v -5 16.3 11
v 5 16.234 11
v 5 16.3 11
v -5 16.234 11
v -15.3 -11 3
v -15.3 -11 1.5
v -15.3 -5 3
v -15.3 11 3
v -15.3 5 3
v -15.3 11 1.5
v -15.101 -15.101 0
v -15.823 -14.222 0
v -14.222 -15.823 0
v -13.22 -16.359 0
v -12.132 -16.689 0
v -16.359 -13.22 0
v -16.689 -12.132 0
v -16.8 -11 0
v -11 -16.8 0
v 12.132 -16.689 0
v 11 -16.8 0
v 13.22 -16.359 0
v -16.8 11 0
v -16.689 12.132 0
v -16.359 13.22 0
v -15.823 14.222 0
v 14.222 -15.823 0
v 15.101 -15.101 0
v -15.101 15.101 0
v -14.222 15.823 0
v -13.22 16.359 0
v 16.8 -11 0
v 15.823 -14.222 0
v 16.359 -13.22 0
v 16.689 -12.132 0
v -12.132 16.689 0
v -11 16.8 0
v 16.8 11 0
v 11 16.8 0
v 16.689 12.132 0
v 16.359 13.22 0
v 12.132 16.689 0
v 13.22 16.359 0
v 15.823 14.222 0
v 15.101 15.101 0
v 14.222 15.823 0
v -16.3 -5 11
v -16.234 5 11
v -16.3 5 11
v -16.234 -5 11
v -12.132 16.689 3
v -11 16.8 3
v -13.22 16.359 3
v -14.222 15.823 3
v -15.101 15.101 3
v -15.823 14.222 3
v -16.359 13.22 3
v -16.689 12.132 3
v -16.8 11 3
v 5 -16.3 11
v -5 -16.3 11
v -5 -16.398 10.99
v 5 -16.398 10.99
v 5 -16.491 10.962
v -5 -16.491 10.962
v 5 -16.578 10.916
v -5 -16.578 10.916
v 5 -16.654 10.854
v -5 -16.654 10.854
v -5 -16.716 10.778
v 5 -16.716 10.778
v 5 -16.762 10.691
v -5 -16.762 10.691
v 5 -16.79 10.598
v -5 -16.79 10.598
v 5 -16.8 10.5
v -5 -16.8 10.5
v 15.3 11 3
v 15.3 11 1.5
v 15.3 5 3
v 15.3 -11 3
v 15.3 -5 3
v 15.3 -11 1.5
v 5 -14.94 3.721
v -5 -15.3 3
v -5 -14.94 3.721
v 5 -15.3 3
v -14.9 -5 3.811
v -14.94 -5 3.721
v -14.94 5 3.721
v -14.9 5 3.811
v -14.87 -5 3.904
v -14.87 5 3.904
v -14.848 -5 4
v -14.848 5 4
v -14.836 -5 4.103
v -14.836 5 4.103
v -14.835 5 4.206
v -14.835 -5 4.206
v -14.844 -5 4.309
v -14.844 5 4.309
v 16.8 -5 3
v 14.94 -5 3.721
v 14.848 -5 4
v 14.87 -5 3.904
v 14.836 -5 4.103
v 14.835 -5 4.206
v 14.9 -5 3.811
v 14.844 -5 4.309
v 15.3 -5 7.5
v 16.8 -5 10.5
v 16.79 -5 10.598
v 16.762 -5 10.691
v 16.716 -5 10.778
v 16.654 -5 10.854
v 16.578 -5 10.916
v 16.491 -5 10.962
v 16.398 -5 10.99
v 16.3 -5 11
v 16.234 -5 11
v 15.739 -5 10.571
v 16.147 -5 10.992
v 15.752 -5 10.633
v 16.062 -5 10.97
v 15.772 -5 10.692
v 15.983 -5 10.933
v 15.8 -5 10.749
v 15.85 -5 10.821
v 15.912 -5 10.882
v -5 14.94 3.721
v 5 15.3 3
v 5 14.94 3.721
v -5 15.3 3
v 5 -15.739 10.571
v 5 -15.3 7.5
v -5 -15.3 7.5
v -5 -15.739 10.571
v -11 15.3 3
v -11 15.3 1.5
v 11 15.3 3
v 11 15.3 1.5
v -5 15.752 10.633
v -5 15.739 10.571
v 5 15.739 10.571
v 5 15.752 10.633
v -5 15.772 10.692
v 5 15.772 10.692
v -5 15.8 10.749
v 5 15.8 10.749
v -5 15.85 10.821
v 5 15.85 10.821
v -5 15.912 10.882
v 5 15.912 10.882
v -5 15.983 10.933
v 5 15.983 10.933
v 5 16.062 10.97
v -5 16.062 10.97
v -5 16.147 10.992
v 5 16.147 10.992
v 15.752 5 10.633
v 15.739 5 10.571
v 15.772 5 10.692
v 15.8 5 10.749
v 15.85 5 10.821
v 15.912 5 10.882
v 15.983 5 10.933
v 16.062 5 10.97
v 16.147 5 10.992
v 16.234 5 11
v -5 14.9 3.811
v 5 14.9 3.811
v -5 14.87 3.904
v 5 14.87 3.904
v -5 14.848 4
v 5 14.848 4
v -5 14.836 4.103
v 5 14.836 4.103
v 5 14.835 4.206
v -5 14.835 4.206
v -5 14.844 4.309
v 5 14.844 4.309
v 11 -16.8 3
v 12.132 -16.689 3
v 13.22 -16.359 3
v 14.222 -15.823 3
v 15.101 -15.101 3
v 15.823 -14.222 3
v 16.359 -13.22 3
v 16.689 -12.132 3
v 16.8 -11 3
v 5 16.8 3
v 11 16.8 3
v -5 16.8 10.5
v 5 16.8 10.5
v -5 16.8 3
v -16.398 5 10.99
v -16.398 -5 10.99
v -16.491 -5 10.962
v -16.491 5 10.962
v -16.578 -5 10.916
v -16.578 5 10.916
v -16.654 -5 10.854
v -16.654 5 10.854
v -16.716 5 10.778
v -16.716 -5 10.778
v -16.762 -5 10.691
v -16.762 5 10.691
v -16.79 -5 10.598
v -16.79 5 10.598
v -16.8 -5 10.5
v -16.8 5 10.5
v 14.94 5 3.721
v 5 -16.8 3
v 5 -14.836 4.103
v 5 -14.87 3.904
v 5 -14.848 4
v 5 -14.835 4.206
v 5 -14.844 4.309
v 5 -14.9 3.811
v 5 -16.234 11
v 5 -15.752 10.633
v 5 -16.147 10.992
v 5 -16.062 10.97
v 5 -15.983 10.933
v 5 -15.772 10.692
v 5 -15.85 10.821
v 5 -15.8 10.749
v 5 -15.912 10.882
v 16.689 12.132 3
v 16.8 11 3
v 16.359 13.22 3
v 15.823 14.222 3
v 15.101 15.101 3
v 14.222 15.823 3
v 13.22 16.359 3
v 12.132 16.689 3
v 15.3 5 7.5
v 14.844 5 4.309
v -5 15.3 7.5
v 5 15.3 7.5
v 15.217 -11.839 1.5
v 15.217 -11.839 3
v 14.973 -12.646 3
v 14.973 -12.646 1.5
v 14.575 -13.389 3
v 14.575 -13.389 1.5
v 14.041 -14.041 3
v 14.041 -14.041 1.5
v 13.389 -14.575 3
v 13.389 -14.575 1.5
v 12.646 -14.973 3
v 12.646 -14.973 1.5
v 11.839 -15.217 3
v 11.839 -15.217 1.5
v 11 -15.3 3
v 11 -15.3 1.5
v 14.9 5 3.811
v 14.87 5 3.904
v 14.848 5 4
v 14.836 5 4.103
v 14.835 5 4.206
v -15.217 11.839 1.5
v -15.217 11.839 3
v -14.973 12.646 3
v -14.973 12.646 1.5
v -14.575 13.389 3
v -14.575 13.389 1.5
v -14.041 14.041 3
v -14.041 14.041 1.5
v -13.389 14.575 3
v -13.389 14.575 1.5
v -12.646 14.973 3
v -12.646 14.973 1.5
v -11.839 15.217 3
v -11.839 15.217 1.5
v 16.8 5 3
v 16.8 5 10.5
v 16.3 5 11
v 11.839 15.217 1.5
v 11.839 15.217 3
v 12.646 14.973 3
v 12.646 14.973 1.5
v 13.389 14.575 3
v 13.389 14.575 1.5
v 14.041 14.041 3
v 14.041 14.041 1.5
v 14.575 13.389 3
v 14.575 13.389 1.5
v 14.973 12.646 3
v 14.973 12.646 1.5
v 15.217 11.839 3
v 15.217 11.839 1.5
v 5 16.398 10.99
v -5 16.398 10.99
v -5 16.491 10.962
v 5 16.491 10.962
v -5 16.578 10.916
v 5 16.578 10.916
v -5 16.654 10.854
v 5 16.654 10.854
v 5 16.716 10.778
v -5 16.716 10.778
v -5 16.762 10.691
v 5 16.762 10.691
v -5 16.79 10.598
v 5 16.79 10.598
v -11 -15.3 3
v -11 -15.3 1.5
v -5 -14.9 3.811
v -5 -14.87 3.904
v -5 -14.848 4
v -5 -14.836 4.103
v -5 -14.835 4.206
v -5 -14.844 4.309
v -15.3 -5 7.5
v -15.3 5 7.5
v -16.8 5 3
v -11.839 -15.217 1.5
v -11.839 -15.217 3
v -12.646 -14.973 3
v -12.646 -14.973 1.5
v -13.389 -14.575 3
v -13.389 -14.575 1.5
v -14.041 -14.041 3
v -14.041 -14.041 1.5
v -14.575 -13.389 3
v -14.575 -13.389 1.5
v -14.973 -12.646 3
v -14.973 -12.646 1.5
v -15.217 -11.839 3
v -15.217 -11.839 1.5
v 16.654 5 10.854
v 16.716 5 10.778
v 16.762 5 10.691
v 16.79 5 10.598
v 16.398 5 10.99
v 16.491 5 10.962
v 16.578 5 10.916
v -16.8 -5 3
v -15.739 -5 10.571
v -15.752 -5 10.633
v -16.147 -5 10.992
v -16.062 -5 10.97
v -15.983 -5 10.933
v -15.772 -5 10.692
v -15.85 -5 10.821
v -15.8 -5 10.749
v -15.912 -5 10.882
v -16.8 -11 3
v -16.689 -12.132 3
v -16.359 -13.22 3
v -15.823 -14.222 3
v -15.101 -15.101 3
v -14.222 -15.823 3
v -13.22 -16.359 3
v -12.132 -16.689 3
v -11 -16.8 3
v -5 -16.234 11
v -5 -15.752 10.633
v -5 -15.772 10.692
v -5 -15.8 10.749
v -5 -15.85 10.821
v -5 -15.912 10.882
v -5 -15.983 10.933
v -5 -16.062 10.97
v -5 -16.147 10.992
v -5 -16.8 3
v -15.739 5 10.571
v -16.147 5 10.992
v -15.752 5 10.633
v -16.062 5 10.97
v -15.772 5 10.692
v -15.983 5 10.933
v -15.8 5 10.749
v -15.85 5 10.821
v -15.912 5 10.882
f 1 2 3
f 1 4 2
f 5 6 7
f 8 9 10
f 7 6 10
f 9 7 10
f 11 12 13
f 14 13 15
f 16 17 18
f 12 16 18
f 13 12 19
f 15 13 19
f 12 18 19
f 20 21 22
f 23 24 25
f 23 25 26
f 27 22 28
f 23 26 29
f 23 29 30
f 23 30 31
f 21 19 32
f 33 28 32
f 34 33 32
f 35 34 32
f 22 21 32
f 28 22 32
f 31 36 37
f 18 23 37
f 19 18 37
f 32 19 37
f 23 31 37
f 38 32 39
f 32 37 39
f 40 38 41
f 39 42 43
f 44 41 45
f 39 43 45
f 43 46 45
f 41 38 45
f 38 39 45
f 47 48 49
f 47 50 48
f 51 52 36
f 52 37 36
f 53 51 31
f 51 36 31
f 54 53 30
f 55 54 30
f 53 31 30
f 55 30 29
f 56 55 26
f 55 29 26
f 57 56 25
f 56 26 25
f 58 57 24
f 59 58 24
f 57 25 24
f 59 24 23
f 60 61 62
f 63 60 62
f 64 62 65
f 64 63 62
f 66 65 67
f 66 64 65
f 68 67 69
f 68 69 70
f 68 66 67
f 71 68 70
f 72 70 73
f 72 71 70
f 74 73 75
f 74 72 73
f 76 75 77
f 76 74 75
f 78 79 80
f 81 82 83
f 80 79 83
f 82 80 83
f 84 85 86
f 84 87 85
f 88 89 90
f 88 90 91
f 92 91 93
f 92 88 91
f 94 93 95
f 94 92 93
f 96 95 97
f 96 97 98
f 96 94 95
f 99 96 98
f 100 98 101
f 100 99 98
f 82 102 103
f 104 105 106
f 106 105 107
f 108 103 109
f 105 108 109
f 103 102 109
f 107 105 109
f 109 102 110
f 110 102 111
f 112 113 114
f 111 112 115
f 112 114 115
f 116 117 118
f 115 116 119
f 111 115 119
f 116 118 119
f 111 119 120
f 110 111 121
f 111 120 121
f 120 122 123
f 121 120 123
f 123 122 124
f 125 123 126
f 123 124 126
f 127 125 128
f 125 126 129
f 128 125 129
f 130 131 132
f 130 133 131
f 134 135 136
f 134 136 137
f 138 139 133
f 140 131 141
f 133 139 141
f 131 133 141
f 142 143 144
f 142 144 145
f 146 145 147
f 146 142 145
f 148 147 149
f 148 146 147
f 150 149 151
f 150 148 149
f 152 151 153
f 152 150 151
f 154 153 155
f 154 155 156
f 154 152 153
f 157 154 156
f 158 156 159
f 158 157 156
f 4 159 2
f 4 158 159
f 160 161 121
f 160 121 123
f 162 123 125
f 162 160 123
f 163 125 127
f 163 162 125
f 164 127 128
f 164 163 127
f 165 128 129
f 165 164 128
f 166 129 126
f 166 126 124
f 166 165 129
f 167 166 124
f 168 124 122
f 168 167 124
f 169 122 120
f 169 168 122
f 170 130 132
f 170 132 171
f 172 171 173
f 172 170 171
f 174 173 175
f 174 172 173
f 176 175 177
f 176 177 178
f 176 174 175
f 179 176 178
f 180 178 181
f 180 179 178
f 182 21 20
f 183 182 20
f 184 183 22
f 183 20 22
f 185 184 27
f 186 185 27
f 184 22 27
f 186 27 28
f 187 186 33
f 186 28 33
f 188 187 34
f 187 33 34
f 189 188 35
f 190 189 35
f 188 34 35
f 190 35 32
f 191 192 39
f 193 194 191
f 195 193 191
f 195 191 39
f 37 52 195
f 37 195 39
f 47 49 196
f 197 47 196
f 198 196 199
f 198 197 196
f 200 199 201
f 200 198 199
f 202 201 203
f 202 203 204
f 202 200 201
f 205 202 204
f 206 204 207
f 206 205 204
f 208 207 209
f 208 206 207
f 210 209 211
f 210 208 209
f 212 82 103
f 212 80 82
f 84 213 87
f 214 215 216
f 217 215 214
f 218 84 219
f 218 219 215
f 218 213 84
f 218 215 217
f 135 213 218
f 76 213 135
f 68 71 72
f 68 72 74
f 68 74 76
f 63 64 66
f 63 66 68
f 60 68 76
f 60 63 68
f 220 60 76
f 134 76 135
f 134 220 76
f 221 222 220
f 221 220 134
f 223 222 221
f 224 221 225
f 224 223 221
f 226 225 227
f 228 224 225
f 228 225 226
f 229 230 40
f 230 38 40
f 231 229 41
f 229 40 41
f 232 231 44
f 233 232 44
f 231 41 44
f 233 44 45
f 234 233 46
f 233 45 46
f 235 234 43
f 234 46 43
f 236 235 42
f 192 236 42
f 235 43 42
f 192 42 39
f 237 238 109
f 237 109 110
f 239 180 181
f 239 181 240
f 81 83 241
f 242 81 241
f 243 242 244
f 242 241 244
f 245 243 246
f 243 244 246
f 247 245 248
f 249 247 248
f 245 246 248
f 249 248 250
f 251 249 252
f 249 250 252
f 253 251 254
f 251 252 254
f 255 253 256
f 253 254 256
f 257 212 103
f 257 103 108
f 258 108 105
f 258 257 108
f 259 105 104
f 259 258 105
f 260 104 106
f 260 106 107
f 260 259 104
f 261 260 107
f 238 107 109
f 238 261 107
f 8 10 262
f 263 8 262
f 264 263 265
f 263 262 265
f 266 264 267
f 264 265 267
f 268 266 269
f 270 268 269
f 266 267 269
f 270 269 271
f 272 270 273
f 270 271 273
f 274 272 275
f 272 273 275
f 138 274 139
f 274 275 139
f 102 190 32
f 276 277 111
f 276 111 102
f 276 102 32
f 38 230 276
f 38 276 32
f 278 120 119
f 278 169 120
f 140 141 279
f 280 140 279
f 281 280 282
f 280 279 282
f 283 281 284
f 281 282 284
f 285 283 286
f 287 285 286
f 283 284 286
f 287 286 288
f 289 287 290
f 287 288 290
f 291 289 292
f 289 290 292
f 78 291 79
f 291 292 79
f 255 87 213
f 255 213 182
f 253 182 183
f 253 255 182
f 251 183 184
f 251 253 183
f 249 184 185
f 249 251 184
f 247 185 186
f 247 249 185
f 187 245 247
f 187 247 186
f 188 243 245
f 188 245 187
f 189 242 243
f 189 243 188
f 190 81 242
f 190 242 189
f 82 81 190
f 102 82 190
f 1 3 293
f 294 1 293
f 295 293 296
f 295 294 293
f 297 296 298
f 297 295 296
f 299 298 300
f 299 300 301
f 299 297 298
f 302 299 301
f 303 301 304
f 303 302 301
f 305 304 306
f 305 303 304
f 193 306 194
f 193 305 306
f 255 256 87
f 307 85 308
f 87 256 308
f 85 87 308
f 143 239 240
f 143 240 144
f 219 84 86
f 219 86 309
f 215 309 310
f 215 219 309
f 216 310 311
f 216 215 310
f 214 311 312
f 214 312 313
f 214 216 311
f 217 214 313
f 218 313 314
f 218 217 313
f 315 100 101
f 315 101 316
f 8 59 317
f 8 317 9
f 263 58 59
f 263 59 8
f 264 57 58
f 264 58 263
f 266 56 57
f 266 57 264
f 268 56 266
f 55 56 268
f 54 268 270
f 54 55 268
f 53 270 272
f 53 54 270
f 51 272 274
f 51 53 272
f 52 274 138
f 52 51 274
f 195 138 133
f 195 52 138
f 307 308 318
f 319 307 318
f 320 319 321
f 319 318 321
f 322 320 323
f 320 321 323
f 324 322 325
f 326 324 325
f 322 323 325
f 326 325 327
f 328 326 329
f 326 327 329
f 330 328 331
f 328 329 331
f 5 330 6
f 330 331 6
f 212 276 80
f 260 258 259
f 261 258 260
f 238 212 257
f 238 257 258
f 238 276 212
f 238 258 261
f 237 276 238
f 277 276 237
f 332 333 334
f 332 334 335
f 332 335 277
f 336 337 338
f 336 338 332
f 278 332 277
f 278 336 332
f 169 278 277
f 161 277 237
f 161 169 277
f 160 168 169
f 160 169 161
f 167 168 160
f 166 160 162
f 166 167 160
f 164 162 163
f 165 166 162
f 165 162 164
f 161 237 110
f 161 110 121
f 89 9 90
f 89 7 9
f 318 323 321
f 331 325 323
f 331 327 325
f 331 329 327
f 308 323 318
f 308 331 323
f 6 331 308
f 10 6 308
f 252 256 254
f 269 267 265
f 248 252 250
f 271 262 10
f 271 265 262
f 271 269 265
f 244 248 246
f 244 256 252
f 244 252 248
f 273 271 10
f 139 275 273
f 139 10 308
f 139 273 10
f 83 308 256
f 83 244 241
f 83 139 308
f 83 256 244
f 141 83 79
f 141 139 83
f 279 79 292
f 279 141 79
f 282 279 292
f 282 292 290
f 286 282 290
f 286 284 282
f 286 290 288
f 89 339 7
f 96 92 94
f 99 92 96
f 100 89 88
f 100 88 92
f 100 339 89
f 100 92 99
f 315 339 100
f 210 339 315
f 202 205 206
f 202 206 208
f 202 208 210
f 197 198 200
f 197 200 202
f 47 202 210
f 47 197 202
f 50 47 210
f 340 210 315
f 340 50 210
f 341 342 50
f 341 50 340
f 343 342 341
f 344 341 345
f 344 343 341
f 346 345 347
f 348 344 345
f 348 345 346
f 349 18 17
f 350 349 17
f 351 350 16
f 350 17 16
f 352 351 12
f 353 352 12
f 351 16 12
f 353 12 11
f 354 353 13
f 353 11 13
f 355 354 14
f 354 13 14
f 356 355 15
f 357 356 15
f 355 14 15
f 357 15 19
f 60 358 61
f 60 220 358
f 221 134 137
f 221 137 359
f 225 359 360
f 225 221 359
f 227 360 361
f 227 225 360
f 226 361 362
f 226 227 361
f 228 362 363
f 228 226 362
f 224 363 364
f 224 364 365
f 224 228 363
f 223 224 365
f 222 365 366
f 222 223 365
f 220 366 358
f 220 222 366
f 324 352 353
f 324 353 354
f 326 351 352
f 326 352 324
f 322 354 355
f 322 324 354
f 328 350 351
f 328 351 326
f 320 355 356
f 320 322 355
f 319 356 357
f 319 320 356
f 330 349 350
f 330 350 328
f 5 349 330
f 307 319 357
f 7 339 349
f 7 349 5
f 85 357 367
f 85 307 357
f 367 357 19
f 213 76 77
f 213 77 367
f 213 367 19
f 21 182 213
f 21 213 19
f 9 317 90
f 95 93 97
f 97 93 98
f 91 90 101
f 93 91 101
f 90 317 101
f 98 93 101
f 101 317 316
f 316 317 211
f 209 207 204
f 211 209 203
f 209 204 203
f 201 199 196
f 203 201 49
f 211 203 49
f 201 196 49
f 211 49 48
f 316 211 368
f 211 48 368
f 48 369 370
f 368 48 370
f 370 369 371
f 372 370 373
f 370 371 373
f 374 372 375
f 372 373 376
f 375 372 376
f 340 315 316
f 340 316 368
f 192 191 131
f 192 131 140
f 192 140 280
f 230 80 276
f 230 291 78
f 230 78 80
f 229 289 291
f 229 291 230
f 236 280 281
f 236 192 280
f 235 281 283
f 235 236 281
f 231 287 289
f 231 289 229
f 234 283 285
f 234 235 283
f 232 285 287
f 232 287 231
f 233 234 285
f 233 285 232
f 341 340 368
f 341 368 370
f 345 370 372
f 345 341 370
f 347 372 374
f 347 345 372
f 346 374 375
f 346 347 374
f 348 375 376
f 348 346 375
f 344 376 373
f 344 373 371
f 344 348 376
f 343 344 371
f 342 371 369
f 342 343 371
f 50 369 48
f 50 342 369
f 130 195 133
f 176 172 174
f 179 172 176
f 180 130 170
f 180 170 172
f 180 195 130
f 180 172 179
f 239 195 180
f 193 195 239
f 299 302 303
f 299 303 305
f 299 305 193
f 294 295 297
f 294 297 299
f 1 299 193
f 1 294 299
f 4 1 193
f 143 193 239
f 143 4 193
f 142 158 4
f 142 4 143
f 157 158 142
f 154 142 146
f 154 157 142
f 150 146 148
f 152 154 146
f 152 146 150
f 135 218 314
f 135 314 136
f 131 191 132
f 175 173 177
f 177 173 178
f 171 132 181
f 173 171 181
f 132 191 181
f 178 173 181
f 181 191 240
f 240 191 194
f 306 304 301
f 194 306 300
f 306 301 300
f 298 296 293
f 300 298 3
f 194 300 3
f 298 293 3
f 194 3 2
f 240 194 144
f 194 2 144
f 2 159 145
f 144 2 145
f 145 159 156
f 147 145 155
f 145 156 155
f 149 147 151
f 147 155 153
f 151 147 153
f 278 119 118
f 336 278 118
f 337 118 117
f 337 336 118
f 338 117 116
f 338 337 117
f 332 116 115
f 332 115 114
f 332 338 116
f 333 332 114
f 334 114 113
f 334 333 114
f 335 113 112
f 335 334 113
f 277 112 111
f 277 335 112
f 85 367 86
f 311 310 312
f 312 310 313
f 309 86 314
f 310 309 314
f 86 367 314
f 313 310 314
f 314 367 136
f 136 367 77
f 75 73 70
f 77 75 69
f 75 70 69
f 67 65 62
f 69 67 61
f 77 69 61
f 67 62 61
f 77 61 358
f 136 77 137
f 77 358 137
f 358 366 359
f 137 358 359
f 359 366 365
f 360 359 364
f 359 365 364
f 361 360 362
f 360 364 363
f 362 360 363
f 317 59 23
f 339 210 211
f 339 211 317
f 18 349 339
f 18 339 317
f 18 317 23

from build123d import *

# Parameters (mm, degrees)
F1_DEPTH      = 1.5
F3_DEPTH      = 1.5
F4_W          = 1
F4_H          = 1
F4_W_2        = 0.5
F5_DEPTH      = 5
F5_DEPTH_BACK = 5
F6_COUNT      = 4
F6_ANGLE      = 270


with BuildPart() as f1:
    # F0 (on Top) → F1 (new body)
    with BuildSketch(Plane.XY):
        with BuildLine():
            ThreePointArc((16.8, 11), (15.1012193309, 15.1012193309), (11, 16.8))
            Line((11, 16.8), (-11, 16.8))
            ThreePointArc((-11, 16.8), (-15.1012193309, 15.1012193309), (-16.8, 11))
            Line((-16.8, 11), (-16.8, -11))
            ThreePointArc((-16.8, -11), (-15.1012193309, -15.1012193309), (-11, -16.8))
            Line((-11, -16.8), (11, -16.8))
            ThreePointArc((11, -16.8), (15.1012193309, -15.1012193309), (16.8, -11))
            Line((16.8, -11), (16.8, 11))
        make_face()
        with BuildLine():
            Line((-11, 15.3), (11, 15.3))
            ThreePointArc((11, 15.3), (14.0405591591, 14.0405591591), (15.3, 11))
            Line((15.3, 11), (15.3, -11))
            ThreePointArc((15.3, -11), (14.0405591591, -14.0405591591), (11, -15.3))
            Line((11, -15.3), (-11, -15.3))
            ThreePointArc((-11, -15.3), (-14.0405591591, -14.0405591591), (-15.3, -11))
            Line((-15.3, -11), (-15.3, 11))
            ThreePointArc((-15.3, 11), (-14.0405591591, 14.0405591591), (-11, 15.3))
        make_face(mode=Mode.SUBTRACT)
        with BuildLine():
            ThreePointArc((15.3, 11), (14.0405591591, 14.0405591591), (11, 15.3))
            Line((11, 15.3), (-11, 15.3))
            ThreePointArc((-11, 15.3), (-14.0405591591, 14.0405591591), (-15.3, 11))
            Line((-15.3, 11), (-15.3, -11))
            ThreePointArc((-15.3, -11), (-14.0405591591, -14.0405591591), (-11, -15.3))
            Line((-11, -15.3), (11, -15.3))
            ThreePointArc((11, -15.3), (14.0405591591, -14.0405591591), (15.3, -11))
            Line((15.3, -11), (15.3, 11))
        make_face()
        with BuildLine():
            Line((-11, 15), (11, 15))
            ThreePointArc((11, 15), (13.8284271247, 13.8284271247), (15, 11))
            Line((15, 11), (15, -11))
            ThreePointArc((15, -11), (13.8284271247, -13.8284271247), (11, -15))
            Line((11, -15), (-11, -15))
            ThreePointArc((-11, -15), (-13.8284271247, -13.8284271247), (-15, -11))
            Line((-15, -11), (-15, 11))
            ThreePointArc((-15, 11), (-13.8284271247, 13.8284271247), (-11, 15))
        make_face(mode=Mode.SUBTRACT)
        with BuildLine():
            ThreePointArc((15, 11), (13.8284271247, 13.8284271247), (11, 15))
            Line((11, 15), (-11, 15))
            ThreePointArc((-11, 15), (-13.8284271247, 13.8284271247), (-15, 11))
            Line((-15, 11), (-15, -11))
            ThreePointArc((-15, -11), (-13.8284271247, -13.8284271247), (-11, -15))
            Line((-11, -15), (11, -15))
            ThreePointArc((11, -15), (13.8284271247, -13.8284271247), (15, -11))
            Line((15, -11), (15, 11))
        make_face()
    extrude(amount=F1_DEPTH)

    # F2 (on face) → F3 (join)
    with BuildSketch(Plane.XY.offset(1.5)):
        with BuildLine():
            Line((16.8, -11), (16.8, 11))
            ThreePointArc((16.8, 11), (15.1012193309, 15.1012193309), (11, 16.8))
            Line((11, 16.8), (-11, 16.8))
            ThreePointArc((-11, 16.8), (-15.1012193309, 15.1012193309), (-16.8, 11))
            Line((-16.8, 11), (-16.8, -11))
            ThreePointArc((-16.8, -11), (-15.1012193309, -15.1012193309), (-11, -16.8))
            Line((-11, -16.8), (11, -16.8))
            ThreePointArc((11, -16.8), (15.1012193309, -15.1012193309), (16.8, -11))
        make_face()
        with BuildLine():
            Line((-11, 15.3), (11, 15.3))
            ThreePointArc((11, 15.3), (14.0405591591, 14.0405591591), (15.3, 11))
            Line((15.3, 11), (15.3, -11))
            ThreePointArc((15.3, -11), (14.0405591591, -14.0405591591), (11, -15.3))
            Line((11, -15.3), (-11, -15.3))
            ThreePointArc((-11, -15.3), (-14.0405591591, -14.0405591591), (-15.3, -11))
            Line((-15.3, -11), (-15.3, 11))
            ThreePointArc((-15.3, 11), (-14.0405591591, 14.0405591591), (-11, 15.3))
        make_face(mode=Mode.SUBTRACT)
    extrude(amount=F3_DEPTH)

    # F4 (on Front) → F5 (join, two sides)
    with BuildSketch(Plane.XZ) as f5_sk:
        with BuildLine():
            Line((-16.8, 10.5), (-16.8, 4))
            Line((-16.8, 4), (-15.8, 4))
            Line((-15.8, 4), (-15.8, 10.7488969095))
            ThreePointArc((-15.8, 10.7488969095), (-15.9830967627, 10.9326941499), (-16.2336477008, 11))
            Line((-16.2336477008, 11), (-16.3, 11))
            ThreePointArc((-16.3, 11), (-16.6535533906, 10.8535533906), (-16.8, 10.5))
        make_face()
        with Locations((-16.3, 3.5)):
            Rectangle(F4_W, F4_H)
        with Locations((-15.55, 3.5)):
            Rectangle(F4_W_2, F4_H)
        with BuildLine():
            Line((-15.8, 10.7488969095), (-15.8, 4))
            Line((-15.8, 4), (-15.3, 4))
            Line((-15.3, 4), (-15.3, 7.5))
            Line((-15.3, 7.5), (-15.738672954, 10.5707106781))
            ThreePointArc((-15.738672954, 10.5707106781), (-15.7608660432, 10.6627190959), (-15.8, 10.7488969095))
        make_face()
        with BuildLine():
            Line((-15.3, 7.5), (-15.3, 4))
            Line((-15.3, 4), (-14.848307792, 4))
            ThreePointArc((-14.848307792, 4), (-14.8342154179, 4.154457802), (-14.8441767052, 4.3092369361))
            Line((-14.8441767052, 4.3092369361), (-15.3, 7.5))
        make_face()
        with BuildLine():
            Line((-15.3, 4), (-15.3, 3))
            Line((-15.3, 3), (-14.9396990078, 3.7206019844))
            ThreePointArc((-14.9396990078, 3.7206019844), (-14.8836806771, 3.8569244249), (-14.848307792, 4))
            Line((-14.848307792, 4), (-15.3, 4))
        make_face()
    extrude(amount=F5_DEPTH)
    extrude(f5_sk.sketch, amount=-F5_DEPTH_BACK)

    # F6: F1 ×4 about axis
    f6_axis = Axis((0, 0, 16.5911819786), (0, 0, 1))


with BuildPart() as f1_1:
    add(f1.part)
    for i in range(1, F6_COUNT):
        add(f1.part.rotate(f6_axis, i * F6_ANGLE / (F6_COUNT - 1)))


solid = f1_1.part
